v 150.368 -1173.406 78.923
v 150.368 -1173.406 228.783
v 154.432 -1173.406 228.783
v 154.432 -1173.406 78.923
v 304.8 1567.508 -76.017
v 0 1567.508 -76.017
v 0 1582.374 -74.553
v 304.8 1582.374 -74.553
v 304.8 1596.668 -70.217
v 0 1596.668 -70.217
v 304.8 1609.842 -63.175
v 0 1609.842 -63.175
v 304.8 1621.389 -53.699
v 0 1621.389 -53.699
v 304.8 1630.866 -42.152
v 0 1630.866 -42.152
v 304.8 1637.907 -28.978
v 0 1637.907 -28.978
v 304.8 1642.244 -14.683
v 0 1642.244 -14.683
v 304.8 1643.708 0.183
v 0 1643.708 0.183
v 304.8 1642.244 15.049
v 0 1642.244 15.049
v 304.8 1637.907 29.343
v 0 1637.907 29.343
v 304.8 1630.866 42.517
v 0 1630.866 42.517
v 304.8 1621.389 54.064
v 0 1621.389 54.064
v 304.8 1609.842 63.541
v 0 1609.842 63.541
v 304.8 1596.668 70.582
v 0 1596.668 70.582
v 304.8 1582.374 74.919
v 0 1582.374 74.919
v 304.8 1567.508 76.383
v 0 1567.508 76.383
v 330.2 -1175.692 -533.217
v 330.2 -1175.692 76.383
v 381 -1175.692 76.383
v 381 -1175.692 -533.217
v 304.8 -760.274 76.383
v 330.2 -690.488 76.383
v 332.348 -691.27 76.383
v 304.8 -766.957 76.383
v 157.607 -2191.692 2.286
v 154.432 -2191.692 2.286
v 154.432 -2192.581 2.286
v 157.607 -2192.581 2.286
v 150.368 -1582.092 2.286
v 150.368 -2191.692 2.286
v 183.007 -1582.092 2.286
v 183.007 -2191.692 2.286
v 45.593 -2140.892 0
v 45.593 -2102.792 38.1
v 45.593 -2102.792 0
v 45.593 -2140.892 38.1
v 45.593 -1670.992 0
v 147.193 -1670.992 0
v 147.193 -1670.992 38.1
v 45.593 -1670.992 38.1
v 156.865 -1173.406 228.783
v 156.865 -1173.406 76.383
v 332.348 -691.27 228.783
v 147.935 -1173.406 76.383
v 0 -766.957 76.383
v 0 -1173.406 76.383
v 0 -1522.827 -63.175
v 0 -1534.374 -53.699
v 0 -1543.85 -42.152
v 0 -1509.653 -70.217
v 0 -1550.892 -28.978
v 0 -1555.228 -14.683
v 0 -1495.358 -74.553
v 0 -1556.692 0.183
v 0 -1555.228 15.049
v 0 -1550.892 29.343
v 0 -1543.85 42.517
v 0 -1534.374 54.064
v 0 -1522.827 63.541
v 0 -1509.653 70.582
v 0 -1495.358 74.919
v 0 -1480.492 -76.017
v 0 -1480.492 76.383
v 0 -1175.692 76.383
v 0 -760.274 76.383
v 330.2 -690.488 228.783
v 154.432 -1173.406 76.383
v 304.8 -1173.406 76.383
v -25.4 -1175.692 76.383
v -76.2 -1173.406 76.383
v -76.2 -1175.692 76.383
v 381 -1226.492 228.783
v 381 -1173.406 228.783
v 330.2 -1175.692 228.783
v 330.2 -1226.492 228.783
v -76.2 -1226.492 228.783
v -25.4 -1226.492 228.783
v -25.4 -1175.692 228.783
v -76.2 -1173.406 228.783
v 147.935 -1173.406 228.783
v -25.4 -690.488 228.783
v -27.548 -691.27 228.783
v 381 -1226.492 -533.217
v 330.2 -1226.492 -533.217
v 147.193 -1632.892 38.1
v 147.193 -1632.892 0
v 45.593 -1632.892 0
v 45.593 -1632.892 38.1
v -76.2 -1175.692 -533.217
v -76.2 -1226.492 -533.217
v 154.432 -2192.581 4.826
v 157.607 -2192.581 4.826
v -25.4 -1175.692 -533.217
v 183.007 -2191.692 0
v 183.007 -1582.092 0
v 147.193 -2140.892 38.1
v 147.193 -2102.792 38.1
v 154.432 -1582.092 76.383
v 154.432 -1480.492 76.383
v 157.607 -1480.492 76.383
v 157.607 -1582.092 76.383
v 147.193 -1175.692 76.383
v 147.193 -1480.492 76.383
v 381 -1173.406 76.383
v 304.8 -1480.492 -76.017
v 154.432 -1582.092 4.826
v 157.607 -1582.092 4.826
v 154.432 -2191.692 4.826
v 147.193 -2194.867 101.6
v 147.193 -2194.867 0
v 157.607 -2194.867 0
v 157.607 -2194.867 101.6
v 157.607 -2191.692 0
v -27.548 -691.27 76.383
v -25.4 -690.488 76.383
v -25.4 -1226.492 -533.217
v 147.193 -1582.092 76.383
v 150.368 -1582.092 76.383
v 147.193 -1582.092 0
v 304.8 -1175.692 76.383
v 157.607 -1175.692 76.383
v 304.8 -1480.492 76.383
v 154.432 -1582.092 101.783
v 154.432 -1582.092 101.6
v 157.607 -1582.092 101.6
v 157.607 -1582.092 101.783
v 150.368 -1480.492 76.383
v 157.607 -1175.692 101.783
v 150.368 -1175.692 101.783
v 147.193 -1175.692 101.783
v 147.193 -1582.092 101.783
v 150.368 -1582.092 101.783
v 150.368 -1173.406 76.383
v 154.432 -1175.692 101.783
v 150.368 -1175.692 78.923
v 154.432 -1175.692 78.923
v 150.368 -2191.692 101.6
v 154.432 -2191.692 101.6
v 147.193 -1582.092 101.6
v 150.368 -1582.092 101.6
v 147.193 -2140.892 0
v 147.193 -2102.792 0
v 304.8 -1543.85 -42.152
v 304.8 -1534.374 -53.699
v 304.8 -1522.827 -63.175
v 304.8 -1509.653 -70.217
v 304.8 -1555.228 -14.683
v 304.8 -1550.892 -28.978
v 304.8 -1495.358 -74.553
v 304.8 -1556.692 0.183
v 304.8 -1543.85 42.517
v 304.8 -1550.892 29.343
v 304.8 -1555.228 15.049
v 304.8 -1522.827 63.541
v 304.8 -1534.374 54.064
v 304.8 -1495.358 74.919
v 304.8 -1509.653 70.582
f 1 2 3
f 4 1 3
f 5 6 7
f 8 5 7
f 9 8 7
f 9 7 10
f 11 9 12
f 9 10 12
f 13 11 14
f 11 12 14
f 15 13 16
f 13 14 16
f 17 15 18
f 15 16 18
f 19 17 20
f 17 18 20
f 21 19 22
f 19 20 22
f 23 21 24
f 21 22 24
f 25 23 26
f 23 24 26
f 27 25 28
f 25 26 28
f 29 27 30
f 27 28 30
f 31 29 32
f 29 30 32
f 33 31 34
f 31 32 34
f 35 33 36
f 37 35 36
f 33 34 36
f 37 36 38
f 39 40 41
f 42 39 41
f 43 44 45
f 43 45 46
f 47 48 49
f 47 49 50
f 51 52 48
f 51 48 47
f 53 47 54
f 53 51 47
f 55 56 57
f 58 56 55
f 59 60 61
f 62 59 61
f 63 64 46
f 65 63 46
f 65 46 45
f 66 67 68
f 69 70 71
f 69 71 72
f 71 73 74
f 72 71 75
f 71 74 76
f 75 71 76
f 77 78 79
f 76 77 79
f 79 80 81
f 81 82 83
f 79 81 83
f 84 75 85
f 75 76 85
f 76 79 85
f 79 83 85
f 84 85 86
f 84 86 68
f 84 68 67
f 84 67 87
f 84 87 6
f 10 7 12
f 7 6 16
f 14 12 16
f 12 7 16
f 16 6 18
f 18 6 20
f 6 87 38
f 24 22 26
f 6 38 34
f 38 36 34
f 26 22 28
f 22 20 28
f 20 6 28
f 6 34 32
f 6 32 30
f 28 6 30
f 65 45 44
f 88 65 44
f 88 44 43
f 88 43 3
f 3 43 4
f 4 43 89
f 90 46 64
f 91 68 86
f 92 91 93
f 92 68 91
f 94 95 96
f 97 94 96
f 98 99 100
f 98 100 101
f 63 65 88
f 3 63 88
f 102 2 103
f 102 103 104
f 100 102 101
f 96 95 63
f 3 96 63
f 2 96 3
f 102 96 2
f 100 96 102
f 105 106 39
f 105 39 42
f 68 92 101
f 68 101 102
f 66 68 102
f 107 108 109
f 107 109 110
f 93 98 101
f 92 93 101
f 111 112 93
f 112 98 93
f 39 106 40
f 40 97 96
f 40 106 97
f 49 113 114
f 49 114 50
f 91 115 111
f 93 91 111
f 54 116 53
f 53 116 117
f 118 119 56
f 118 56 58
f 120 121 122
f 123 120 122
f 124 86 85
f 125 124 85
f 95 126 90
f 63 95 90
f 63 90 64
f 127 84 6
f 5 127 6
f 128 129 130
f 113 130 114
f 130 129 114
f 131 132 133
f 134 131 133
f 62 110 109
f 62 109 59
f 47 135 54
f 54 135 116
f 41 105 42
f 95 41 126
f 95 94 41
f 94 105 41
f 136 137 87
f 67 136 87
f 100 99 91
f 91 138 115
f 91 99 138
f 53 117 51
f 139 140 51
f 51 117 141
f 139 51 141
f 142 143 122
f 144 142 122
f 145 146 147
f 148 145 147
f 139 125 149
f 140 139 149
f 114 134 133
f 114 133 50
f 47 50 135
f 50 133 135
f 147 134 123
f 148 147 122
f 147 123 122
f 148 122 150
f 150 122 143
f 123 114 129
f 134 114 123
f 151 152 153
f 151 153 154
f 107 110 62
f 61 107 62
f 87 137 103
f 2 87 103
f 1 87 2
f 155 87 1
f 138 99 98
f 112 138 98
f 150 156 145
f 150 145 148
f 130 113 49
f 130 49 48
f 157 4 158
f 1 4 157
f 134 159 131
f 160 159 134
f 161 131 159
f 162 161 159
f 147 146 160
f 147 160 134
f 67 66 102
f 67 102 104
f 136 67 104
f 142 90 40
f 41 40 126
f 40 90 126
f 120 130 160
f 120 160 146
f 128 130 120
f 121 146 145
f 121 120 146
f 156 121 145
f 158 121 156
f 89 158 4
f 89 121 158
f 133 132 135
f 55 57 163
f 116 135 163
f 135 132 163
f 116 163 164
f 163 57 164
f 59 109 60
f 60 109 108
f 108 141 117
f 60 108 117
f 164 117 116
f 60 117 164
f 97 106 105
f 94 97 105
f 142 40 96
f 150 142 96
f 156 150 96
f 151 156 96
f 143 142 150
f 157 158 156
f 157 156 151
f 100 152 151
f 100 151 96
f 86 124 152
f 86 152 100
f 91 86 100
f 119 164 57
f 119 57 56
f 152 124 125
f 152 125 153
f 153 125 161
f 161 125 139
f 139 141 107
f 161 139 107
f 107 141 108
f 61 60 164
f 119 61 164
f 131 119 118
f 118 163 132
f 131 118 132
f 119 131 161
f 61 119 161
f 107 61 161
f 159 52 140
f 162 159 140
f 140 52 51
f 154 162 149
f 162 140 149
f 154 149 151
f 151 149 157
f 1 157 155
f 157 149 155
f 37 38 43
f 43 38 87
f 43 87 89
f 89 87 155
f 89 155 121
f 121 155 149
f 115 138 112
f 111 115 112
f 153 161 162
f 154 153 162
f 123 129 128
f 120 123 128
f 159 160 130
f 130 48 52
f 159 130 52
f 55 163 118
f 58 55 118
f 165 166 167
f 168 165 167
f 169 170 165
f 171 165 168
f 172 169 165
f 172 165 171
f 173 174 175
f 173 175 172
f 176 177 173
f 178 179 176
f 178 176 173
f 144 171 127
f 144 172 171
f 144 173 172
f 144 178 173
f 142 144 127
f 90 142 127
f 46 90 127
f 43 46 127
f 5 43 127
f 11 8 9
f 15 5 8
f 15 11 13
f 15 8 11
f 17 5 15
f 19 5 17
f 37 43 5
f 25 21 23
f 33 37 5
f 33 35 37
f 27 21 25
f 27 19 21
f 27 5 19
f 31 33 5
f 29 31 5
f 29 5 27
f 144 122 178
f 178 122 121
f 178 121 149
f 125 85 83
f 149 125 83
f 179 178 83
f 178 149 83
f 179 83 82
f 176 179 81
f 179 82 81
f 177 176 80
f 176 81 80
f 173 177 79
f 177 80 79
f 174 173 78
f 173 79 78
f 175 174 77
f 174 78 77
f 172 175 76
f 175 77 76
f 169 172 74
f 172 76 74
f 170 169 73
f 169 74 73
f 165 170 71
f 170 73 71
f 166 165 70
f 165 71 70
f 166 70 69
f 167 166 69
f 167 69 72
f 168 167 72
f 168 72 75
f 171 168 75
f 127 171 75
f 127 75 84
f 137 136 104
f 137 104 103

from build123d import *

# Parameters (mm, degrees)
F1_DEPTH      = 304.8
F3_DEPTH      = 152.4
F2_W          = 50.8
F2_H          = 50.8
F4_DEPTH      = 152.4
F4_DEPTH_BACK = 609.6
F8_W          = 4.064
F8_H          = 2.54
F9_DEPTH      = 2.286
F10_W         = 3.175
F10_H         = 304.8
F10_H_2       = 101.6
F11_DEPTH     = 25.4
F12_W         = 3.175
F12_H         = 609.6
F13_DEPTH     = 101.6
F12_W_2       = 4.064
F12_W_3       = 25.4
F14_DEPTH     = 2.286
F15_W         = 38.1
F15_H         = 38.1
F16_DEPTH     = 101.6
F18_DEPTH     = 3.175


# Not quite as in the source:
# - a feature of the source that left no trace in its solid (it failed there, or was rolled back) is left out
# - a pattern or mirror of a feature is missing from the dataset's text; its kind, count and spacing are read off the source's solid


with BuildPart() as f1:
    # F0 (on Right) → F1 (new body)
    with BuildSketch(Plane.YZ):
        with BuildLine():
            Line((1567.5077411821, 76.3827925089), (-1480.4922588179, 76.3827925089))
            ThreePointArc((-1480.4922588179, 76.3827925089), (-1556.6922588179, 0.1827925089), (-1480.4922588179, -76.0172074911))
            Line((-1480.4922588179, -76.0172074911), (1567.5077411821, -76.0172074911))
            ThreePointArc((1567.5077411821, -76.0172074911), (1643.7077411821, 0.1827925089), (1567.5077411821, 76.3827925089))
        make_face()
    extrude(amount=F1_DEPTH)

    # F2 (on face) → F3 (join)
    with BuildSketch(Plane.XY.offset(76.3827925089)):
        Polygon((330.2, -1175.6922588179), (381, -1175.6922588179), (381, -1173.4062588179), (304.8, -1173.4062588179), (304.8, -1175.6922588179), align=None)
        Polygon((152.4, -1175.6922588179), (304.8, -1175.6922588179), (304.8, -1173.4062588179), (156.8647103879, -1173.4062588179), (154.432, -1173.4062588179), (152.4, -1173.4062588179), align=None)
        Polygon((304.8, -760.2735742093), (304.8, -766.9573910681), (332.3481373311, -691.2695058028), (330.2, -690.4876477552), align=None)
        Polygon((154.432, -1173.4062588179), (156.8647103879, -1173.4062588179), (304.8, -766.9573910681), (304.8, -760.2735742093), align=None)
    f3 = extrude(amount=F3_DEPTH)

    # F3_copies: F3 across plane
    add(f3.mirror(Plane(origin=(152.4, 0, 0), x_dir=(0, 0, -1), z_dir=(-1, 0, 0))))

    # F2 (on face) → F4 (join, two sides)
    with BuildSketch(Plane.XY.offset(76.3827925089)) as f4_sk:
        with Locations((355.6, -1201.0922588179)):
            Rectangle(F2_W, F2_H)
    f4 = extrude(amount=F4_DEPTH) + extrude(f4_sk.sketch, amount=-F4_DEPTH_BACK)

    # F4_copies: F4 across plane
    add(f4.mirror(Plane(origin=(152.4, 0, 0), x_dir=(0, 0, -1), z_dir=(-1, 0, 0))))

    # F8 (on face) → F9 (cut, through all)
    with BuildSketch(Plane(origin=(0, -1173.4062588179, 0), x_dir=(-1, 0, 0), z_dir=(0, 1, 0))):
        with Locations((-152.4, 77.6527925089)):
            Rectangle(F8_W, F8_H)
    extrude(amount=-F9_DEPTH, mode=Mode.SUBTRACT)

    # F10 (on face) → F11 (join)
    with BuildSketch(Plane.XY.offset(76.3827925089)):
        with Locations((156.0195, -1328.0922588179)):
            Rectangle(F10_W, F10_H)
        with Locations((148.7805, -1328.0922588179)):
            Rectangle(F10_W, F10_H)
        with Locations((156.0195, -1531.2922588179)):
            Rectangle(F10_W, F10_H_2)
        with Locations((148.7805, -1531.2922588179)):
            Rectangle(F10_W, F10_H_2)
    extrude(amount=F11_DEPTH)

    # F12 (on Top) → F13 (join)
    with BuildSketch(Plane.XY):
        with Locations((148.7805, -1886.8922588179)):
            Rectangle(F12_W, F12_H)
        with Locations((156.0195, -1886.8922588179)):
            Rectangle(F12_W, F12_H)
        Polygon((154.432, -2191.6922588179), (150.368, -2191.6922588179), (147.193, -2191.6922588179), (147.193, -2194.8672588179), (157.607, -2194.8672588179), (157.607, -2191.6922588179), align=None)
    extrude(amount=F13_DEPTH)

    # F12 (on Top) → F14 (join)
    with BuildSketch(Plane.XY):
        with Locations((152.4, -1886.8922588179)):
            Rectangle(F12_W_2, F12_H)
        with Locations((170.307, -1886.8922588179)):
            Rectangle(F12_W_3, F12_H)
        with Locations((156.0195, -1886.8922588179)):
            Rectangle(F12_W, F12_H)
    extrude(amount=F14_DEPTH)

    # F15 (on face) → F16 (join)
    with BuildSketch(Plane(origin=(147.193, 0, 0), x_dir=(0, -1, 0), z_dir=(-1, 0, 0))):
        with Locations((1651.9422588179, 19.05)):
            Rectangle(F15_W, F15_H)
        with Locations((2121.8422588179, 19.05)):
            Rectangle(F15_W, F15_H)
    extrude(amount=F16_DEPTH)

    # F17 (on face) → F18 (cut, through all)
    with BuildSketch(Plane.YZ.offset(157.607)):
        Polygon((-2192.5812588179, 4.826), (-2192.5812588179, 2.286), (-2191.6922588179, 2.286), (-1582.0922588179, 2.286), (-1582.0922588179, 4.826), align=None)
    extrude(amount=-F18_DEPTH, mode=Mode.SUBTRACT)


solid = f1.part
